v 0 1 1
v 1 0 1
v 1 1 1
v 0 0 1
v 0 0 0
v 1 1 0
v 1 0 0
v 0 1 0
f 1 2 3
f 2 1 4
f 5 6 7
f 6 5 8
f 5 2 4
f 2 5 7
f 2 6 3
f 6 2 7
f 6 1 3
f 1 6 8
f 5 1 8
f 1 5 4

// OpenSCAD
sploof = undef; // exists to be overridden from cli command

module example_scad () {
  a = [1, 2, ["a", true, false, 0, undef]];
  echo("__RECORD", "AAA", a);
  echo("__RECORD", "a.b.c.d", 23);
  echo("__RECORD", "sploof", sploof);
  cube(size = 1);
}
example_scad();
